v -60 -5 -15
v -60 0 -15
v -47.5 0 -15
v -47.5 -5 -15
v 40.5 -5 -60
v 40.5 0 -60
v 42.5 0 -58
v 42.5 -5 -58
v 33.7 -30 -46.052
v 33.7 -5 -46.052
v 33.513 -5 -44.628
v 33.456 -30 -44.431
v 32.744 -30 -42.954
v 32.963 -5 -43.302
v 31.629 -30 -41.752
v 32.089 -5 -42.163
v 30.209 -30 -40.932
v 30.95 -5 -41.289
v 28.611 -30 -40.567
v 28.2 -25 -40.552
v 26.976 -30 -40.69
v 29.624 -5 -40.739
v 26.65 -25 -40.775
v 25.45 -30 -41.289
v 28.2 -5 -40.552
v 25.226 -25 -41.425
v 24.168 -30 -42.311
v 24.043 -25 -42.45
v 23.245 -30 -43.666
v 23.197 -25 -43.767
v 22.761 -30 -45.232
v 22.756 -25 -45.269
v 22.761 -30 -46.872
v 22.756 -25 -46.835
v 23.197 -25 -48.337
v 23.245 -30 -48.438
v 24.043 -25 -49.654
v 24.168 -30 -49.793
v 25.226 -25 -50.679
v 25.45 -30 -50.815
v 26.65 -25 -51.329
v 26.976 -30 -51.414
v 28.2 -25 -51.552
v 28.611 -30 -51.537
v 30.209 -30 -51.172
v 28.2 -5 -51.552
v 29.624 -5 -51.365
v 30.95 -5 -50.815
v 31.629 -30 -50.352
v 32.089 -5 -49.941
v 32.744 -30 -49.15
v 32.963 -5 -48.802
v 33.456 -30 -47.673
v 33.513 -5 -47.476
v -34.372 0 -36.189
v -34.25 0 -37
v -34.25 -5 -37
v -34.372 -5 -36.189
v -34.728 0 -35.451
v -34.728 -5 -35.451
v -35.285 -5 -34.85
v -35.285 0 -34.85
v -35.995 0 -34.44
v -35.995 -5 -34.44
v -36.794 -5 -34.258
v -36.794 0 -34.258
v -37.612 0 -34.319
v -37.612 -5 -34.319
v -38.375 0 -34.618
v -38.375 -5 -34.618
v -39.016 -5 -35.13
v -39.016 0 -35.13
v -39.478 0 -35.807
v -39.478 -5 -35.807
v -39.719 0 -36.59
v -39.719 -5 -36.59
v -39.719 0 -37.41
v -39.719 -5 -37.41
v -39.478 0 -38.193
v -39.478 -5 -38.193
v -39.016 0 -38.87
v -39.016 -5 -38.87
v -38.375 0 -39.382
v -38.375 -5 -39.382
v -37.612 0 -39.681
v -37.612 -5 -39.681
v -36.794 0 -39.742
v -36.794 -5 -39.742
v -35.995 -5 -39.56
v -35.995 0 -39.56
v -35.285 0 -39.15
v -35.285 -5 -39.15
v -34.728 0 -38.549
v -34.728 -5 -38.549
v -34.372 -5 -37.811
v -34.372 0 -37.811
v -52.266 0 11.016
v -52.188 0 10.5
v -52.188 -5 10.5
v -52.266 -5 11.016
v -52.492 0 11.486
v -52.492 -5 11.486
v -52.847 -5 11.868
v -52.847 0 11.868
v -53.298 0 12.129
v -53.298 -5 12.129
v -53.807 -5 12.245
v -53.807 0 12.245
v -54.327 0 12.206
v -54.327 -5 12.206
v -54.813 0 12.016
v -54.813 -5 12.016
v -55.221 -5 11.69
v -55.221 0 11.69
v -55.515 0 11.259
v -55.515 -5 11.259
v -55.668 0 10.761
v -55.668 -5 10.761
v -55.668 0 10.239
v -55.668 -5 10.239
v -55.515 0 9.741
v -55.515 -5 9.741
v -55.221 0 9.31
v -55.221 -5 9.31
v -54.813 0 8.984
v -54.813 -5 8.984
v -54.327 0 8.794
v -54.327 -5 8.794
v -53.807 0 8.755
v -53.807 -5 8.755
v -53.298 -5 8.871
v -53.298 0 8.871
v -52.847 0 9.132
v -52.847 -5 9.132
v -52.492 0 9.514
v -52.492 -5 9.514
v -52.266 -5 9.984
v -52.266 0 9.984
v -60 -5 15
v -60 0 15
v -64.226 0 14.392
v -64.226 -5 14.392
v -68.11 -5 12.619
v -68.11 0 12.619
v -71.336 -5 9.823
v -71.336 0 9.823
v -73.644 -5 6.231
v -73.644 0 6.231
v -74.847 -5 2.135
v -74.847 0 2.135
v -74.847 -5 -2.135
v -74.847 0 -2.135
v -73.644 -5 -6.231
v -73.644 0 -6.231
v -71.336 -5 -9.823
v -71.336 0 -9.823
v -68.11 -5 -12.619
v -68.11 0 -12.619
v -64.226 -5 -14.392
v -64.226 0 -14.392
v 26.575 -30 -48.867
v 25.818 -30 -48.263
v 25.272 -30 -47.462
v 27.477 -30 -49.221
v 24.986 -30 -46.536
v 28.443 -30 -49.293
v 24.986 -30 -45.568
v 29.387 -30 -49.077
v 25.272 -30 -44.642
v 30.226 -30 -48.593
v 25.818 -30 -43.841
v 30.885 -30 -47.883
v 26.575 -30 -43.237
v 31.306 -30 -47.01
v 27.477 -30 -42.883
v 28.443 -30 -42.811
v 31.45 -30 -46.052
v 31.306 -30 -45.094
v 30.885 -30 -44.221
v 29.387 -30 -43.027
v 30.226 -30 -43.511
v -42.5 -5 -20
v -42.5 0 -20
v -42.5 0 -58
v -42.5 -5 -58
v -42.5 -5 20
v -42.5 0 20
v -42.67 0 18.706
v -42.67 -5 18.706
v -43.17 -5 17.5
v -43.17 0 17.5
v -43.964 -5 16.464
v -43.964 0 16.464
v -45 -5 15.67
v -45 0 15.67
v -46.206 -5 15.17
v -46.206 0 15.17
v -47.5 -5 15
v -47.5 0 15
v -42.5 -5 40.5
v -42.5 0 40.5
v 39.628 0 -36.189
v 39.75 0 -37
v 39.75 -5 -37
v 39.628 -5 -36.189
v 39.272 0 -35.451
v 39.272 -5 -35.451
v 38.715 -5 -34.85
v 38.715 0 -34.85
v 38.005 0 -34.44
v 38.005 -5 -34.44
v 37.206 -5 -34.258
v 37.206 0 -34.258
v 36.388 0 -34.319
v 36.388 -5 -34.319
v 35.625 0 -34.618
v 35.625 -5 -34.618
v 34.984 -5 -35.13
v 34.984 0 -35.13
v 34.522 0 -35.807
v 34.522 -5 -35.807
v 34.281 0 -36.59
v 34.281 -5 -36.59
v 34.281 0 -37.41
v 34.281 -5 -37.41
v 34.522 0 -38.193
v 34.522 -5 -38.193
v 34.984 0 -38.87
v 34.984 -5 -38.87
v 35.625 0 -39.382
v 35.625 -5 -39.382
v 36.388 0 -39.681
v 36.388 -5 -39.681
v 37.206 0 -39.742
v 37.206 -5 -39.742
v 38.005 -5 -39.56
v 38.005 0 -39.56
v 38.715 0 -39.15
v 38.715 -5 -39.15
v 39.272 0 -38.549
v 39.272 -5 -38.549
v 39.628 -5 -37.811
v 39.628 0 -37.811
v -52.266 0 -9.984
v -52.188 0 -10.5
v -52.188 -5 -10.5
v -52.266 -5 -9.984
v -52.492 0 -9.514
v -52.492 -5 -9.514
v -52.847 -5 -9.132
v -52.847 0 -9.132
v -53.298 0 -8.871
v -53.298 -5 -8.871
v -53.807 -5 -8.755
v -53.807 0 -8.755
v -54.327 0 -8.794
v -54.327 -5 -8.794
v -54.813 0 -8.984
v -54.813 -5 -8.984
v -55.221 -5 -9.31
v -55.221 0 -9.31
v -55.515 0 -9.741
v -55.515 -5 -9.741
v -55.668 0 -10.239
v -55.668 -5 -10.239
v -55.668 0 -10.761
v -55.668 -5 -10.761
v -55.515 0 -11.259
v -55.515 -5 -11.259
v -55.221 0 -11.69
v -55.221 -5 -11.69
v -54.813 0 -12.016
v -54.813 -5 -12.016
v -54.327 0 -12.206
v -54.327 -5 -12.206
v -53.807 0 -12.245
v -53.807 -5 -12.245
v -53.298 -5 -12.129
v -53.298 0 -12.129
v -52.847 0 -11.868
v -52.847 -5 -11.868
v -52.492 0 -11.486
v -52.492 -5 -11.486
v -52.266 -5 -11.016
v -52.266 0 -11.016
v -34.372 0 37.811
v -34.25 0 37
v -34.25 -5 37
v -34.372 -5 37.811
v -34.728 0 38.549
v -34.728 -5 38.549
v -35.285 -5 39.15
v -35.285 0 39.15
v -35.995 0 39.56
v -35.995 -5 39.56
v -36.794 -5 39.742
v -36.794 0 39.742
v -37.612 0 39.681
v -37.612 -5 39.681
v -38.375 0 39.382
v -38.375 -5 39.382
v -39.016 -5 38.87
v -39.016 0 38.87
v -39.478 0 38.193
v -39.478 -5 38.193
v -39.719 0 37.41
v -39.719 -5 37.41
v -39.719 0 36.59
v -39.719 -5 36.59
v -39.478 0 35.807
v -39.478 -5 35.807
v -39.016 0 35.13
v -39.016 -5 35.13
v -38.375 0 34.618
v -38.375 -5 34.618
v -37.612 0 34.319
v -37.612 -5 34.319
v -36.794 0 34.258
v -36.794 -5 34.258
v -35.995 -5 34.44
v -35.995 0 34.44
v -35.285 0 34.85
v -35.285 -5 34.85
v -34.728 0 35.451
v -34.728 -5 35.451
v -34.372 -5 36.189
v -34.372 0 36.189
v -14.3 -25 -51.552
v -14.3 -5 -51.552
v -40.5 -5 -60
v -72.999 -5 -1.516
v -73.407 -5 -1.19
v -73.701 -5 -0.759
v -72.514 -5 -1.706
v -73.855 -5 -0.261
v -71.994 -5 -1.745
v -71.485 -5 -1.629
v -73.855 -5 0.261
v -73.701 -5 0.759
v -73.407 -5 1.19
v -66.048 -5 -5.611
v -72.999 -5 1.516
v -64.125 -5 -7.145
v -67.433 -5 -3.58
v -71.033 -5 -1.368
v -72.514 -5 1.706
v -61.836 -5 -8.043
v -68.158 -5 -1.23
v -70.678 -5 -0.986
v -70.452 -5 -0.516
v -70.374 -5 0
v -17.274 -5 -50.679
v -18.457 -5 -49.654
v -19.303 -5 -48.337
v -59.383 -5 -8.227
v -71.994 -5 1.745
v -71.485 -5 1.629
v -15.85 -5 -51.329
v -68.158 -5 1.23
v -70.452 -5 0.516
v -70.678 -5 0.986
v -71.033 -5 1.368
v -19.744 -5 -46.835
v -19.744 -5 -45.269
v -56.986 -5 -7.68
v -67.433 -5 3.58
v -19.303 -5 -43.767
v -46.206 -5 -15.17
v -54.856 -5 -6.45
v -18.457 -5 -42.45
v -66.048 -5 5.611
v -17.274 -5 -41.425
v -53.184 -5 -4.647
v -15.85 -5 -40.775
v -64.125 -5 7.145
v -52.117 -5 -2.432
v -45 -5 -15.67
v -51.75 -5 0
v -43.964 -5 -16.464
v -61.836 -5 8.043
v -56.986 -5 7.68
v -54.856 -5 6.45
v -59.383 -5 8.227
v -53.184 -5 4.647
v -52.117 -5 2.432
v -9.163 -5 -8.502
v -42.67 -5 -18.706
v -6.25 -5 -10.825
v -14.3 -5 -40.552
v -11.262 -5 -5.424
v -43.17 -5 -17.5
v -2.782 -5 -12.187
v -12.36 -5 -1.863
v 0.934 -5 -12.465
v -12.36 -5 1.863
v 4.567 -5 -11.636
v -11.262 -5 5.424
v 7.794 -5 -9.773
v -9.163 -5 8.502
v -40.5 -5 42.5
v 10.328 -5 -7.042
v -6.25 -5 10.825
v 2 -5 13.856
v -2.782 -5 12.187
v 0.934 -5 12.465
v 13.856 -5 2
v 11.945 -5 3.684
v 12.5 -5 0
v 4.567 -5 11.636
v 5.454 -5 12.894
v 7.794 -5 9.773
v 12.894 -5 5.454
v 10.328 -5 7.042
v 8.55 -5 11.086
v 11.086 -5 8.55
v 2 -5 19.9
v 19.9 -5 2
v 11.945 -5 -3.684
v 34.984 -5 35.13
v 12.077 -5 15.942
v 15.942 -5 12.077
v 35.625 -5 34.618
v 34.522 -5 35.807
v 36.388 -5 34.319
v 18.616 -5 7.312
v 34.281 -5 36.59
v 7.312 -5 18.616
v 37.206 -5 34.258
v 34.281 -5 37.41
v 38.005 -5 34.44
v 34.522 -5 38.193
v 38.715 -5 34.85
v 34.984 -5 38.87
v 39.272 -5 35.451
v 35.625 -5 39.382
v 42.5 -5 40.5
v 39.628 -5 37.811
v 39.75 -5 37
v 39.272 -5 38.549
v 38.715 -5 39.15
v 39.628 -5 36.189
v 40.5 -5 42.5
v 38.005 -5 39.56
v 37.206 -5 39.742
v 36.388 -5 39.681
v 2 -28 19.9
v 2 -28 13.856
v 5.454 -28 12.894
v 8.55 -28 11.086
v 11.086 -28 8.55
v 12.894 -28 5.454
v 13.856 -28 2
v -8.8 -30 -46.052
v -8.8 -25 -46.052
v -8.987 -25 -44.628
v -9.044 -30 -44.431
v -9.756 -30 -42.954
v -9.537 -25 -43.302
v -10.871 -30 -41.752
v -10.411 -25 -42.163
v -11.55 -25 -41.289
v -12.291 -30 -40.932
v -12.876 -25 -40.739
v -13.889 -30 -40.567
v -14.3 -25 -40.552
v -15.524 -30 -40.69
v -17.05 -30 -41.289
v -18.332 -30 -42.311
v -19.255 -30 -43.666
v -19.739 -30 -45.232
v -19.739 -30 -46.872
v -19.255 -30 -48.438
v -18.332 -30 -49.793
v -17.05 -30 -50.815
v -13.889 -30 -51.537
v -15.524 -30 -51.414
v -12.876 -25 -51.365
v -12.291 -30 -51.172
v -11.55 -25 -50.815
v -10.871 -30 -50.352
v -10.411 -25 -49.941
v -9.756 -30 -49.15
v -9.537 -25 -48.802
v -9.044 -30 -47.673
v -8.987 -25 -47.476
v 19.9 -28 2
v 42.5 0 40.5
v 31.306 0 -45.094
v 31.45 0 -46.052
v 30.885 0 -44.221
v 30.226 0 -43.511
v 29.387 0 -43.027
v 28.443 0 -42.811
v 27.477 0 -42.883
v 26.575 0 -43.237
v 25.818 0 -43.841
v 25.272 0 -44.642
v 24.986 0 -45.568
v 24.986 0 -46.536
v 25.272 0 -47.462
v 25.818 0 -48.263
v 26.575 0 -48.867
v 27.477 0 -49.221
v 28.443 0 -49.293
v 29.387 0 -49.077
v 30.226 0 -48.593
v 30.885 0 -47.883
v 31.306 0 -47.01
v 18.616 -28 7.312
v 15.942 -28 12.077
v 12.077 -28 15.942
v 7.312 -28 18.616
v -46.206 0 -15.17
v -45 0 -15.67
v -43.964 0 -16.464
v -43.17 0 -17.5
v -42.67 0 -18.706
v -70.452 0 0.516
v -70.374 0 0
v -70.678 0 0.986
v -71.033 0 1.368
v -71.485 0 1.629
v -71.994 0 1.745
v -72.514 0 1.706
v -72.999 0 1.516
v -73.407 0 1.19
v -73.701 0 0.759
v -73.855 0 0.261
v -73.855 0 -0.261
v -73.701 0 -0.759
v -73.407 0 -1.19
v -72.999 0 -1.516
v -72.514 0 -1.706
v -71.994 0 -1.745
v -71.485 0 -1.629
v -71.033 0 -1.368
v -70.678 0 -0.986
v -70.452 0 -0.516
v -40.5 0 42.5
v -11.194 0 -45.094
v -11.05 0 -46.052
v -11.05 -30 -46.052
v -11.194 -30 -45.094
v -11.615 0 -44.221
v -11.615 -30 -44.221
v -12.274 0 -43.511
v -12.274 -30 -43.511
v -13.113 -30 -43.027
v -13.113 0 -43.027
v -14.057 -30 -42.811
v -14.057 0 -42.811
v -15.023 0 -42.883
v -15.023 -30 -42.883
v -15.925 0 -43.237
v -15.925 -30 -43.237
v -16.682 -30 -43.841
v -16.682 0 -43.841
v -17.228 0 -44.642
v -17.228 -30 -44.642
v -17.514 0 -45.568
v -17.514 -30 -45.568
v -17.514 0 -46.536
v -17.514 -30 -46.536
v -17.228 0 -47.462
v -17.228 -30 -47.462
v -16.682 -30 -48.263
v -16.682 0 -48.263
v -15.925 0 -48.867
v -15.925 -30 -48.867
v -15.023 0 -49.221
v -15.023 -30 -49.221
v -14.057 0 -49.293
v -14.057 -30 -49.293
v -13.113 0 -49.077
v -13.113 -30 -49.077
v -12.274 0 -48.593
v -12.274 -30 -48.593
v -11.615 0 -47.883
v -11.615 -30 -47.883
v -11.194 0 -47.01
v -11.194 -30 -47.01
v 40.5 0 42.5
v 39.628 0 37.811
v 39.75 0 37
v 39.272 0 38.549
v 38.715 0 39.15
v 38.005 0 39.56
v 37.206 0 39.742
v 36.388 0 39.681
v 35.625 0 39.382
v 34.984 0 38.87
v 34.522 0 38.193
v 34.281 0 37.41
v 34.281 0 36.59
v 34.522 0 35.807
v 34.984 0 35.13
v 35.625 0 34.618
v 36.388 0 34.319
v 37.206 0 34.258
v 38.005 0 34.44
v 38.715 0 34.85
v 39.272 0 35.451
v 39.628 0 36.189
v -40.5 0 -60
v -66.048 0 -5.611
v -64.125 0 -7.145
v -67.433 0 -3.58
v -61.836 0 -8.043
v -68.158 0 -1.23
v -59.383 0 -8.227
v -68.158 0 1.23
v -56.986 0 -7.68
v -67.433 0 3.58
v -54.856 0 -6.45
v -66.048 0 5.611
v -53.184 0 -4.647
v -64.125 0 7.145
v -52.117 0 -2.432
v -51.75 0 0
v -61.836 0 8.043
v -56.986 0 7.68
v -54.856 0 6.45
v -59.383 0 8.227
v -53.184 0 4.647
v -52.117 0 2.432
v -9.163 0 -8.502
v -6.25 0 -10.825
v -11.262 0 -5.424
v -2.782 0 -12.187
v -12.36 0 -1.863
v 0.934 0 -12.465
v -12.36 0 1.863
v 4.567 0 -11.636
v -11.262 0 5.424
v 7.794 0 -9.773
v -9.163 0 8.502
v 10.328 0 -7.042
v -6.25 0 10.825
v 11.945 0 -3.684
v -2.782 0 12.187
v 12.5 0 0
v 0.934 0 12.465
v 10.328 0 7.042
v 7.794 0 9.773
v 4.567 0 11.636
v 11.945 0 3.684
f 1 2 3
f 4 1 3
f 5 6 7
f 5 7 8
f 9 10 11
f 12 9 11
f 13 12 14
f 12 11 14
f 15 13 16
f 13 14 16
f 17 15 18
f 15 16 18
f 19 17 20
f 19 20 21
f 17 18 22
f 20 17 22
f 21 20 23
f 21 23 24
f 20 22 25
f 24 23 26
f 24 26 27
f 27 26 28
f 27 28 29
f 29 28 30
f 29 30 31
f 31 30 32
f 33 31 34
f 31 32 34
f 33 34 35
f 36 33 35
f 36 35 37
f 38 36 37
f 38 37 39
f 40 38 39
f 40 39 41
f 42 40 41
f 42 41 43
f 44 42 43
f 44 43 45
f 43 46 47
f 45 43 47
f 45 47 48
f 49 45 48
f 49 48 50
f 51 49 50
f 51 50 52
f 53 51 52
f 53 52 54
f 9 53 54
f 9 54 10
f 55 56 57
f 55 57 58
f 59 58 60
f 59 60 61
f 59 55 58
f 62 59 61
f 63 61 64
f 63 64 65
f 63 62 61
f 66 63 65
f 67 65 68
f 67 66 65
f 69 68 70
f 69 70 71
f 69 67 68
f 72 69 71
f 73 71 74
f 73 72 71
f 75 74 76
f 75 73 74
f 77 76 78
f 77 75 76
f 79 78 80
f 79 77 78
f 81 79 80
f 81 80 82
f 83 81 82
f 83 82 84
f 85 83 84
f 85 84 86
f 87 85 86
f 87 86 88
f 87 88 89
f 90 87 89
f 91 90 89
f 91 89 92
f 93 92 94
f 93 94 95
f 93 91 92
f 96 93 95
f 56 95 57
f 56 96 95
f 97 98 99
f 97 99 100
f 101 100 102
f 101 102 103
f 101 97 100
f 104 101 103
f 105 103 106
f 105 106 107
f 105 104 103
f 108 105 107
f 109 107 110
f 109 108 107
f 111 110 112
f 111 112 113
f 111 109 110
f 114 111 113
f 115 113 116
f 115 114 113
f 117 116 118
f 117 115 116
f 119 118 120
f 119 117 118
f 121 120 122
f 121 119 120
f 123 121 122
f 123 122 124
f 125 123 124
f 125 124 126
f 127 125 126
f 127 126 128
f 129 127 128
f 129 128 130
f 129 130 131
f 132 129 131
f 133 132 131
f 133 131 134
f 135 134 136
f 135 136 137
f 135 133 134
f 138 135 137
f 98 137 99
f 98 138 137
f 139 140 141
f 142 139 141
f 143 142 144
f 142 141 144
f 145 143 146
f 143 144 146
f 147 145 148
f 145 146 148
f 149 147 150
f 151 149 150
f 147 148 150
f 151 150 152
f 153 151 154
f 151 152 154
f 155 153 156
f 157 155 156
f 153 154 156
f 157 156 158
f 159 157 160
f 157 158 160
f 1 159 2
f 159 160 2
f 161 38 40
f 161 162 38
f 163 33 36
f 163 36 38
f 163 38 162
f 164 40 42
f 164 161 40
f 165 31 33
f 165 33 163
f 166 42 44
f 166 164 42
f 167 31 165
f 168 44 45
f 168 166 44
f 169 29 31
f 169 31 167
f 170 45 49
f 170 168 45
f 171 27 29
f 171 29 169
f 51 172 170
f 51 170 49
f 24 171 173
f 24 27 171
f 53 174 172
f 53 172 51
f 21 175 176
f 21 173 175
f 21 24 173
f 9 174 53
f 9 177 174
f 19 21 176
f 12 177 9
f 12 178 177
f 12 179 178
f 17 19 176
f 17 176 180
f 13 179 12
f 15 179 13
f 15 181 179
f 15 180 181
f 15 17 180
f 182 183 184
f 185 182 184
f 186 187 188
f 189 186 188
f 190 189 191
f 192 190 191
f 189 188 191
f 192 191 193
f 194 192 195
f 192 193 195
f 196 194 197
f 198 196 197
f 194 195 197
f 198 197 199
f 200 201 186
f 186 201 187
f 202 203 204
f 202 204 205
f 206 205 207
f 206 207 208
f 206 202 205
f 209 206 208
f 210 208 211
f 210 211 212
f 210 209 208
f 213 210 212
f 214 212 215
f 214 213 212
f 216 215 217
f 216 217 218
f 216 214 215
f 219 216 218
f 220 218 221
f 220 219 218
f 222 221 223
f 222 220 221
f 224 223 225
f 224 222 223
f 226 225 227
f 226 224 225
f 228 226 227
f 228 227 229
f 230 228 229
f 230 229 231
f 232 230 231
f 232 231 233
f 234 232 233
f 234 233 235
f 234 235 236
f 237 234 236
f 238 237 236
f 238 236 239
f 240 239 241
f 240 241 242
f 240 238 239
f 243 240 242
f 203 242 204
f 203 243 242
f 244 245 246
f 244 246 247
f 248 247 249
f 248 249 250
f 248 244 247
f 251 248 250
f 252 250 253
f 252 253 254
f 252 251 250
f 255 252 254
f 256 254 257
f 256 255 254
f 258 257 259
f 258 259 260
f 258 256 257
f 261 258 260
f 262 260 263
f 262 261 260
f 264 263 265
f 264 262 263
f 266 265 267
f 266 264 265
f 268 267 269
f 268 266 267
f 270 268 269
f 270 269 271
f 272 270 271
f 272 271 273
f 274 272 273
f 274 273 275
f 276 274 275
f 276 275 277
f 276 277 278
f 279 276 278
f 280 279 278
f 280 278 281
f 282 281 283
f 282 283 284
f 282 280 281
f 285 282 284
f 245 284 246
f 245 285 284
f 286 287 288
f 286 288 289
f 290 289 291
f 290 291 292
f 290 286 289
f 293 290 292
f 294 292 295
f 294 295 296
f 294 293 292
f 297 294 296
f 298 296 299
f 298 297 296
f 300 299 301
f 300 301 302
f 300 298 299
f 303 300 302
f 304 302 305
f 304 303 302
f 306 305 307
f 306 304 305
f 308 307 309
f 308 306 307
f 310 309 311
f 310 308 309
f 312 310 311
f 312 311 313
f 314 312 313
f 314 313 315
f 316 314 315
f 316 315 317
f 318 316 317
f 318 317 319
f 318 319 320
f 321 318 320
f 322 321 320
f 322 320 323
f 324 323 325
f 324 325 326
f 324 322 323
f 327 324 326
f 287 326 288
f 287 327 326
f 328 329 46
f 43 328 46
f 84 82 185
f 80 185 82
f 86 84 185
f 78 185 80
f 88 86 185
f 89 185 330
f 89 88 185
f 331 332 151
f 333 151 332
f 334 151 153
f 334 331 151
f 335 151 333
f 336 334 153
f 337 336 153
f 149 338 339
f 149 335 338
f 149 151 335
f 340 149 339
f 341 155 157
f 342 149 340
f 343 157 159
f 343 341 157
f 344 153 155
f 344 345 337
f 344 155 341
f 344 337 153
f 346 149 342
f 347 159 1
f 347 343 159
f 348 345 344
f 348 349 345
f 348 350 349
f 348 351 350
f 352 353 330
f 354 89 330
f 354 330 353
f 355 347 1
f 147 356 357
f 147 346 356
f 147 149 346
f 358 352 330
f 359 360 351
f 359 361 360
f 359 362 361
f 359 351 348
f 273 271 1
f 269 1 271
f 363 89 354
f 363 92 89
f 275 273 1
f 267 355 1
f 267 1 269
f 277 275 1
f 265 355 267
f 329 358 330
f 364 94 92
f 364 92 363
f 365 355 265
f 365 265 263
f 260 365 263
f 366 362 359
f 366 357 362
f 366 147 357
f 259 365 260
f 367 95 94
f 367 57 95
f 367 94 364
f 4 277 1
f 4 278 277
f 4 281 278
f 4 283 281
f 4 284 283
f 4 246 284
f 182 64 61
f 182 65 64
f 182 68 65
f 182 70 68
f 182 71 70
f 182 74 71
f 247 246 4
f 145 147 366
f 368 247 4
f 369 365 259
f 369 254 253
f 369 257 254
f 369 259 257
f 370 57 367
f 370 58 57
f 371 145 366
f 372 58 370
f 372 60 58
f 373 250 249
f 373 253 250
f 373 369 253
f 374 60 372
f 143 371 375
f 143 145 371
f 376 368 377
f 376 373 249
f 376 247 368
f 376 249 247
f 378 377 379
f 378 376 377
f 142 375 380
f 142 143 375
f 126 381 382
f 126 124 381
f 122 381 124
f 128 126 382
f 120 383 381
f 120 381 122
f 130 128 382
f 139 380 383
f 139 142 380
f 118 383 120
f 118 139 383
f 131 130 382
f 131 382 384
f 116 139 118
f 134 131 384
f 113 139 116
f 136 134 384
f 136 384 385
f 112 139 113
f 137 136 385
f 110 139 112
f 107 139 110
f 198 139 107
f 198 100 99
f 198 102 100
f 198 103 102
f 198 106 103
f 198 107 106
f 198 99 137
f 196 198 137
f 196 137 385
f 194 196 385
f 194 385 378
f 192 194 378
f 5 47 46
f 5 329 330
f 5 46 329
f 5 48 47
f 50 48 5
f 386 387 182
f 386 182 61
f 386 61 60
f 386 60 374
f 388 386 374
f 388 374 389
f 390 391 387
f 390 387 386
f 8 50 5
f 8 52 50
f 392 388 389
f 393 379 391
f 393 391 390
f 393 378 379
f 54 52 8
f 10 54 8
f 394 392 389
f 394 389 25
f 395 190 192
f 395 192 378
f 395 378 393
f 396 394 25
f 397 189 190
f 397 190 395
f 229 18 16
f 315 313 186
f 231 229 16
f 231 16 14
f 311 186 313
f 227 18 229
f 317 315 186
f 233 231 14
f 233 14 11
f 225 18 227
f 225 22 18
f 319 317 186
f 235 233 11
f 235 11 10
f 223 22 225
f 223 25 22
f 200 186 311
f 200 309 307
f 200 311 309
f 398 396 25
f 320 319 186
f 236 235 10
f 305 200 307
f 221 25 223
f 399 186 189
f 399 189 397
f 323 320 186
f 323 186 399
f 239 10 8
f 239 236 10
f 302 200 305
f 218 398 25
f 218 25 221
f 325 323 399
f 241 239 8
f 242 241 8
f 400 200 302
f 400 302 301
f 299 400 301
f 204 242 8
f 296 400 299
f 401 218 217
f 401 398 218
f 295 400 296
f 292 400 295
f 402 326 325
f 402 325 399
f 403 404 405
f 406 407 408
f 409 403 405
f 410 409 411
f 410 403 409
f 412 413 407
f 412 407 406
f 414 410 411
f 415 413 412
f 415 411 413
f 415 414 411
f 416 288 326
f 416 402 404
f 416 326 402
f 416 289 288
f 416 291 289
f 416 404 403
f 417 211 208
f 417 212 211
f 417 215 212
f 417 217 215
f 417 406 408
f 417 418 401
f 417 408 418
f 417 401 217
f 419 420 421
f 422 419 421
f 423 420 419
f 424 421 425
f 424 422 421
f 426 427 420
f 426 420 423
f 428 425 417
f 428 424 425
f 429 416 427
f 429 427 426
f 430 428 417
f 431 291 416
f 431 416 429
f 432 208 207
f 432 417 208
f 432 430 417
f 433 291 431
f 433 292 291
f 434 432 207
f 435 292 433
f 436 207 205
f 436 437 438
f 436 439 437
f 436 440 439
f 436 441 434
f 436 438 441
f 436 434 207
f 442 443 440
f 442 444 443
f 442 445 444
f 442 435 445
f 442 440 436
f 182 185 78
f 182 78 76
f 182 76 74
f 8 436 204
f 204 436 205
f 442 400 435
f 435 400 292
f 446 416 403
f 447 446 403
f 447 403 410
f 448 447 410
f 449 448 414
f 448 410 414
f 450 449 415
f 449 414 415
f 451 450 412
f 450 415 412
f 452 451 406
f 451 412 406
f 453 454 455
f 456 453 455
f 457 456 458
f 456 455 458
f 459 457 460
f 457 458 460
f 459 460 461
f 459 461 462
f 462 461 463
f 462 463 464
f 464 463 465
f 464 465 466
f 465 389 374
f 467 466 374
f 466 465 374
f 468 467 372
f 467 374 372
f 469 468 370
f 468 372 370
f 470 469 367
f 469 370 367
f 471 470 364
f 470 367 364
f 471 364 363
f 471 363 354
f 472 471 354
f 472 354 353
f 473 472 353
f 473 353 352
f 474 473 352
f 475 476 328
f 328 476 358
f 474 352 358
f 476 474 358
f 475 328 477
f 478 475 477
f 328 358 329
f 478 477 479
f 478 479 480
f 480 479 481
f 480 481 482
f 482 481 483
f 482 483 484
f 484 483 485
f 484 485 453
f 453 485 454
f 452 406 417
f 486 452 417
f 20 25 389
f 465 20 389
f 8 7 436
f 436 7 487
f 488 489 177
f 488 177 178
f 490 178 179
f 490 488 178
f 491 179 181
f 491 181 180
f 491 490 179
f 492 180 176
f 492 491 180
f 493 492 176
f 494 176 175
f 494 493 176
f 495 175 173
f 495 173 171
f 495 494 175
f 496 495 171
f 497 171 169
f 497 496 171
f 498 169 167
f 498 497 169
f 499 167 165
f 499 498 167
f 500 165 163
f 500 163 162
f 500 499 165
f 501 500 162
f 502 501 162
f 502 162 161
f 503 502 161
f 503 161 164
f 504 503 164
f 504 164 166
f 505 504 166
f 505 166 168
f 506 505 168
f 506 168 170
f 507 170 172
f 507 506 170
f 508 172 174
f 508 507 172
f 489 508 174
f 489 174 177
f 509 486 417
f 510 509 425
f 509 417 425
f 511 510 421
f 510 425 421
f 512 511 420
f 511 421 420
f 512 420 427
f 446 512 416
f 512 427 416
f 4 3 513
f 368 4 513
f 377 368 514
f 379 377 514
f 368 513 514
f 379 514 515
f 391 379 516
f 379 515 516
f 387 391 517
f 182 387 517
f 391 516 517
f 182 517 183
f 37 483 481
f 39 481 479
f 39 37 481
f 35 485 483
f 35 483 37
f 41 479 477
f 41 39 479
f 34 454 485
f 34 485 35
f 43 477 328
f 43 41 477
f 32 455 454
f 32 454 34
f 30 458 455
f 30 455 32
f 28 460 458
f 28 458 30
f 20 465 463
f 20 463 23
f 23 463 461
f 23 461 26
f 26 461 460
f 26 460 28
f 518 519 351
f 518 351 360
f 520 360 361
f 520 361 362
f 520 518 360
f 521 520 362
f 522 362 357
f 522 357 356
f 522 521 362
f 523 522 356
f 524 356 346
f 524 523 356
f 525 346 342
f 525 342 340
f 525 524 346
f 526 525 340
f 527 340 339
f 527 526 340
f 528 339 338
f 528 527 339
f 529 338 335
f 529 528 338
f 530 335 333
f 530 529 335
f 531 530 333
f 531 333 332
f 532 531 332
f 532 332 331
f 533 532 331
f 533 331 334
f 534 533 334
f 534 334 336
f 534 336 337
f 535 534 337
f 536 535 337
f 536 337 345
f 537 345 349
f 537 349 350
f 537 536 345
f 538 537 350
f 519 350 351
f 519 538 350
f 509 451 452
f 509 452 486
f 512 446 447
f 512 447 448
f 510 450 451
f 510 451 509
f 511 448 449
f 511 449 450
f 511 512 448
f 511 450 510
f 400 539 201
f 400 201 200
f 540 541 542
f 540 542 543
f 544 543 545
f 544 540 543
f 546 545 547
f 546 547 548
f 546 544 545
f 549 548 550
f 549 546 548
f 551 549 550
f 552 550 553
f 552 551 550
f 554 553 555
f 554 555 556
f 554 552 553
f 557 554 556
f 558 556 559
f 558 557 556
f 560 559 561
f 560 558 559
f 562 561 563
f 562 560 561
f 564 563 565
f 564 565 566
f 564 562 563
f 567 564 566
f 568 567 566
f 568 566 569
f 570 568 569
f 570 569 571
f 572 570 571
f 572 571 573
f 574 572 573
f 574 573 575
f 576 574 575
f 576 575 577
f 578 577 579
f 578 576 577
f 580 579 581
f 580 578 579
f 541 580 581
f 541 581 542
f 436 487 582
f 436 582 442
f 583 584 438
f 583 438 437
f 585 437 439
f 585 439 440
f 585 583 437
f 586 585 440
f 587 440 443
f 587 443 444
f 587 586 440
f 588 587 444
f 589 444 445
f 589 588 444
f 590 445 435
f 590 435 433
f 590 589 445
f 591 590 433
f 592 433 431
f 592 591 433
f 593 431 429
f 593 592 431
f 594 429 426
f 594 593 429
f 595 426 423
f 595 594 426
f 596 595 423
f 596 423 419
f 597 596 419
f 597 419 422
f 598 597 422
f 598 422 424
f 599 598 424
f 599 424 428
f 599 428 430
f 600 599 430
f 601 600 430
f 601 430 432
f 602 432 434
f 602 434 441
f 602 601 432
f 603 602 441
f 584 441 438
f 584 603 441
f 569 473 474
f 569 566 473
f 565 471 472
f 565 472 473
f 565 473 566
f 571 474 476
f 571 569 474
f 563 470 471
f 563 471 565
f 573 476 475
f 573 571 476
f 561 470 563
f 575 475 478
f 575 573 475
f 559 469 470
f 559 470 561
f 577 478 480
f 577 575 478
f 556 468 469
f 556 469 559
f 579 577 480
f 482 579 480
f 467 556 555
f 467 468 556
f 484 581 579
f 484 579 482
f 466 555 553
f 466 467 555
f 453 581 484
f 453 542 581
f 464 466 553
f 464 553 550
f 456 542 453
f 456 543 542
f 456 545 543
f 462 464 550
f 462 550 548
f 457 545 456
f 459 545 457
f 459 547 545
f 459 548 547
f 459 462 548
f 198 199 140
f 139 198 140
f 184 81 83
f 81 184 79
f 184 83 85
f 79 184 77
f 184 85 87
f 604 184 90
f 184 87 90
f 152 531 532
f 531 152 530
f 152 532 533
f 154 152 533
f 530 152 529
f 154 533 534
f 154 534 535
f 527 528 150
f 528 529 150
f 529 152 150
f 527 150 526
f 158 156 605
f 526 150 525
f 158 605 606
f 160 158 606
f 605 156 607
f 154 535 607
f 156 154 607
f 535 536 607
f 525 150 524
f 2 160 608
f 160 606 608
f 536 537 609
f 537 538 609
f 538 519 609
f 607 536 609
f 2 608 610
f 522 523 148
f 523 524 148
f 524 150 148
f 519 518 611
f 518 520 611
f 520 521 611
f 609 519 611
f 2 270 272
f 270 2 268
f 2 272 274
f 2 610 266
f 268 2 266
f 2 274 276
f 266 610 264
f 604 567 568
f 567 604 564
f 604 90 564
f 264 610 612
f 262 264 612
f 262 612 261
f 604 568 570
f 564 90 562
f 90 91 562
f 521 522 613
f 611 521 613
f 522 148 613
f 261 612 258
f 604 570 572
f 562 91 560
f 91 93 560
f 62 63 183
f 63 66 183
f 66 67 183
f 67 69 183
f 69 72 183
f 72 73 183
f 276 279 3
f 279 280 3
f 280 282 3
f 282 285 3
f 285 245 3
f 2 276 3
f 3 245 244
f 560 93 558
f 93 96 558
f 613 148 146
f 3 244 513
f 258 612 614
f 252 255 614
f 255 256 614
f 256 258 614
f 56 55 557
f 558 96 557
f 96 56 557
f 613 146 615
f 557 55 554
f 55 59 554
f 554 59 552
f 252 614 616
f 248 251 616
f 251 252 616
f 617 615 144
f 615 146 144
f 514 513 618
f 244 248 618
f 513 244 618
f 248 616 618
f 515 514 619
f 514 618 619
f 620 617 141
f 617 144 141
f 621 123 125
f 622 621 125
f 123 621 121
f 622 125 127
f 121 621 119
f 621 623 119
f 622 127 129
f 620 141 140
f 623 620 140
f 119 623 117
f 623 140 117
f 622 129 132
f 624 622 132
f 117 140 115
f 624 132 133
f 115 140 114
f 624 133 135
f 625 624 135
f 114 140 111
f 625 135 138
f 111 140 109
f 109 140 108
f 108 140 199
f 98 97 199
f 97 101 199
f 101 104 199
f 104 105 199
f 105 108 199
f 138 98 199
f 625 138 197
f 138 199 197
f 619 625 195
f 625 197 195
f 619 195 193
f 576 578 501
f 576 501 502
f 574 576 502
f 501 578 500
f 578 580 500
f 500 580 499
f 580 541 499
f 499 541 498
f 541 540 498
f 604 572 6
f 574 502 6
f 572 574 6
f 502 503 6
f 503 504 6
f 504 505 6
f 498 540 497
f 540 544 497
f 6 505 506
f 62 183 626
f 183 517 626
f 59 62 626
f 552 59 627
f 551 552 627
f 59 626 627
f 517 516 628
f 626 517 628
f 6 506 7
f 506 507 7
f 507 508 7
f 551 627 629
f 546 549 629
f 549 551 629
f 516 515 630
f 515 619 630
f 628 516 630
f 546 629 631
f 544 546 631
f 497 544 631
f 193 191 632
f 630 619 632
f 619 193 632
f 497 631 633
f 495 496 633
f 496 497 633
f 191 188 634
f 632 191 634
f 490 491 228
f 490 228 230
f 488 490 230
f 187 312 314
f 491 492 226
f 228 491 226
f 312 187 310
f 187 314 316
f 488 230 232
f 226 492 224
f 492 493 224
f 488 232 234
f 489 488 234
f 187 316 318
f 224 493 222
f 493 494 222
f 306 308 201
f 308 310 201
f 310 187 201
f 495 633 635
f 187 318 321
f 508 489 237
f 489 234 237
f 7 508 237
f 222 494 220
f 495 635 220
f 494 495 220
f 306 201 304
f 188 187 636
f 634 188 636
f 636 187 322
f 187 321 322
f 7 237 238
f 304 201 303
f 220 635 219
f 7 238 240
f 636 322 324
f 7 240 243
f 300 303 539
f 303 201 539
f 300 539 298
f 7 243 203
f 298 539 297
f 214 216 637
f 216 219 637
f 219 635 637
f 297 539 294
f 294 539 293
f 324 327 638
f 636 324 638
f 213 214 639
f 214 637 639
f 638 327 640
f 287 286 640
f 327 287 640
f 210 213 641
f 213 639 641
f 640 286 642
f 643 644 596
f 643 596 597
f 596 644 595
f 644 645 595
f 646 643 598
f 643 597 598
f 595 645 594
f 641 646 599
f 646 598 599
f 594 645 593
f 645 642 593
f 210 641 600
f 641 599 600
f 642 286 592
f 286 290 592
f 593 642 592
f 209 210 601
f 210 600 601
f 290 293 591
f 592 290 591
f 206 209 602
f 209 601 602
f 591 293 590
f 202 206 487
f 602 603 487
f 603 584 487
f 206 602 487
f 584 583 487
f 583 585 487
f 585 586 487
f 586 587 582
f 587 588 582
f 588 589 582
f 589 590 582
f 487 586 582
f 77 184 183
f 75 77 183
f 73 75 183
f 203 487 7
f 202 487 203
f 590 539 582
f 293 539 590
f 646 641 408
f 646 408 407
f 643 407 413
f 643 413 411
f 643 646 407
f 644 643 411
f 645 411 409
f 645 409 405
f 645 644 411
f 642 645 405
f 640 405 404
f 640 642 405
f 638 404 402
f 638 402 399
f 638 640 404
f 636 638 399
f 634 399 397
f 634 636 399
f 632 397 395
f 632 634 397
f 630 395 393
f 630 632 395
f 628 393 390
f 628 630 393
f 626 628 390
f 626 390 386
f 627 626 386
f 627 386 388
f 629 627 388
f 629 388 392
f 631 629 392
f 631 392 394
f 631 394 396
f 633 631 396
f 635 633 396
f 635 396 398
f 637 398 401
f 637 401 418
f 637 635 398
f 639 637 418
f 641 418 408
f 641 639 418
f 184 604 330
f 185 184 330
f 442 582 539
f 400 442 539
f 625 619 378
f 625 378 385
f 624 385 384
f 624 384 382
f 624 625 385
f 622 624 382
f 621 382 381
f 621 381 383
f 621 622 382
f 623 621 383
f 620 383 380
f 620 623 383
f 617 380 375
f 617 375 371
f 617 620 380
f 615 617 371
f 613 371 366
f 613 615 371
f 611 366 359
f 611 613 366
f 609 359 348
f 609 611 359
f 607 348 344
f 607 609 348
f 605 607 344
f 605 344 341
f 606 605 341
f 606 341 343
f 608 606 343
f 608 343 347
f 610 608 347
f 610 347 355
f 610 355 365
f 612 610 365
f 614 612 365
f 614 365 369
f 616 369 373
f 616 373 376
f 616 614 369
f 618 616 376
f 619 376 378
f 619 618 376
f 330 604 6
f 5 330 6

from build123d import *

# Parameters (mm, degrees)
F0_R     = 5.5
F0_R_2   = 3.25
F1_DEPTH = 30
F2_R     = 2.75
F2_R_2   = 1.75
F2_R_3   = 3.5
F2_R_4   = 8.25
F2_R_5   = 12.5
F3_DEPTH = 5
F5_DEPTH = 28
F7_DEPTH = 25
F8_SIZE  = 2


with BuildPart() as f1:
    # F0 (on Front) → F1 (new body)
    with BuildSketch(Plane.XZ):
        with Locations((28.2, -46.052)):
            Circle(F0_R)
        with Locations((28.2, -46.052)):
            Circle(F0_R_2, mode=Mode.SUBTRACT)
    extrude(amount=F1_DEPTH)



with BuildPart() as f1b:
    # F0 (on Front) → F1, piece 2 (new body)
    with BuildSketch(Plane.XZ):
        with Locations((-14.3, -46.052)):
            Circle(F0_R)
        with Locations((-14.3, -46.052)):
            Circle(F0_R_2, mode=Mode.SUBTRACT)
    extrude(amount=F1_DEPTH)


with BuildPart() as f1_1:
    add(f1.part)

    add(f1b.part)  # F3 merges F1b
    # F2 (on Front) → F3 (join)
    with BuildSketch(Plane.XZ):
        with BuildLine():
            Line((-47.5, 15), (-60, 15))
            ThreePointArc((-60, 15), (-75, 0), (-60, -15))
            Line((-60, -15), (-47.5, -15))
            ThreePointArc((-47.5, -15), (-43.9644660941, -16.4644660941), (-42.5, -20))
            Line((-42.5, -20), (-42.5, -60))
            Line((-42.5, -60), (42.5, -60))
            Line((42.5, -60), (42.5, 42.5))
            Line((42.5, 42.5), (-42.5, 42.5))
            Line((-42.5, 42.5), (-42.5, 20))
            ThreePointArc((-42.5, 20), (-43.9644660941, 16.4644660941), (-47.5, 15))
        make_face()
        with Locations((-37, -37)):
            Circle(F2_R, mode=Mode.SUBTRACT)
        with Locations((-53.9378221735, -10.5)):
            Circle(F2_R_2, mode=Mode.SUBTRACT)
        with Locations((-14.3, -46.052)):
            Circle(F2_R_3, mode=Mode.SUBTRACT)
        with Locations((28.2, -46.052)):
            Circle(F2_R_3, mode=Mode.SUBTRACT)
        with Locations((37, -37)):
            Circle(F2_R, mode=Mode.SUBTRACT)
        with Locations((-72.124355653, 0)):
            Circle(F2_R_2, mode=Mode.SUBTRACT)
        with Locations((-60, 0)):
            Circle(F2_R_4, mode=Mode.SUBTRACT)
        with Locations((-53.9378221735, 10.5)):
            Circle(F2_R_2, mode=Mode.SUBTRACT)
        with Locations((-37, 37)):
            Circle(F2_R, mode=Mode.SUBTRACT)
        Circle(F2_R_5, mode=Mode.SUBTRACT)
        with Locations((37, 37)):
            Circle(F2_R, mode=Mode.SUBTRACT)
    extrude(amount=F3_DEPTH)

    # F4 (on Front) → F5 (join)
    with BuildSketch(Plane.XZ):
        with BuildLine():
            Line((2, 19.8997487421), (2, 13.8564064606))
            ThreePointArc((2, 13.8564064606), (9.8994949366, 9.8994949366), (13.8564064606, 2))
            Line((13.8564064606, 2), (19.8997487421, 2))
            ThreePointArc((19.8997487421, 2), (14.1421356237, 14.1421356237), (2, 19.8997487421))
        make_face()
    extrude(amount=F5_DEPTH)

    # F6 (on Front) → F7 (join)
    with BuildSketch(Plane.XZ):
        with BuildLine():
            Line((28.2, -40.552), (-14.3, -40.552))
            ThreePointArc((-14.3, -40.552), (-8.8, -46.052), (-14.3, -51.552))
            Line((-14.3, -51.552), (28.2, -51.552))
            ThreePointArc((28.2, -51.552), (22.7, -46.052), (28.2, -40.552))
        make_face()
    extrude(amount=F7_DEPTH)

    # F8
    f8_edges = [f1_1.edges().sort_by_distance(p)[0] for p in [
        (-42.5, -2.5, 42.5),
        (42.5, -2.5, 42.5),
        (42.5, -2.5, -60),
        (-42.5, -2.5, -60),
    ]]
    chamfer(f8_edges, length=F8_SIZE)


solid = f1_1.part
